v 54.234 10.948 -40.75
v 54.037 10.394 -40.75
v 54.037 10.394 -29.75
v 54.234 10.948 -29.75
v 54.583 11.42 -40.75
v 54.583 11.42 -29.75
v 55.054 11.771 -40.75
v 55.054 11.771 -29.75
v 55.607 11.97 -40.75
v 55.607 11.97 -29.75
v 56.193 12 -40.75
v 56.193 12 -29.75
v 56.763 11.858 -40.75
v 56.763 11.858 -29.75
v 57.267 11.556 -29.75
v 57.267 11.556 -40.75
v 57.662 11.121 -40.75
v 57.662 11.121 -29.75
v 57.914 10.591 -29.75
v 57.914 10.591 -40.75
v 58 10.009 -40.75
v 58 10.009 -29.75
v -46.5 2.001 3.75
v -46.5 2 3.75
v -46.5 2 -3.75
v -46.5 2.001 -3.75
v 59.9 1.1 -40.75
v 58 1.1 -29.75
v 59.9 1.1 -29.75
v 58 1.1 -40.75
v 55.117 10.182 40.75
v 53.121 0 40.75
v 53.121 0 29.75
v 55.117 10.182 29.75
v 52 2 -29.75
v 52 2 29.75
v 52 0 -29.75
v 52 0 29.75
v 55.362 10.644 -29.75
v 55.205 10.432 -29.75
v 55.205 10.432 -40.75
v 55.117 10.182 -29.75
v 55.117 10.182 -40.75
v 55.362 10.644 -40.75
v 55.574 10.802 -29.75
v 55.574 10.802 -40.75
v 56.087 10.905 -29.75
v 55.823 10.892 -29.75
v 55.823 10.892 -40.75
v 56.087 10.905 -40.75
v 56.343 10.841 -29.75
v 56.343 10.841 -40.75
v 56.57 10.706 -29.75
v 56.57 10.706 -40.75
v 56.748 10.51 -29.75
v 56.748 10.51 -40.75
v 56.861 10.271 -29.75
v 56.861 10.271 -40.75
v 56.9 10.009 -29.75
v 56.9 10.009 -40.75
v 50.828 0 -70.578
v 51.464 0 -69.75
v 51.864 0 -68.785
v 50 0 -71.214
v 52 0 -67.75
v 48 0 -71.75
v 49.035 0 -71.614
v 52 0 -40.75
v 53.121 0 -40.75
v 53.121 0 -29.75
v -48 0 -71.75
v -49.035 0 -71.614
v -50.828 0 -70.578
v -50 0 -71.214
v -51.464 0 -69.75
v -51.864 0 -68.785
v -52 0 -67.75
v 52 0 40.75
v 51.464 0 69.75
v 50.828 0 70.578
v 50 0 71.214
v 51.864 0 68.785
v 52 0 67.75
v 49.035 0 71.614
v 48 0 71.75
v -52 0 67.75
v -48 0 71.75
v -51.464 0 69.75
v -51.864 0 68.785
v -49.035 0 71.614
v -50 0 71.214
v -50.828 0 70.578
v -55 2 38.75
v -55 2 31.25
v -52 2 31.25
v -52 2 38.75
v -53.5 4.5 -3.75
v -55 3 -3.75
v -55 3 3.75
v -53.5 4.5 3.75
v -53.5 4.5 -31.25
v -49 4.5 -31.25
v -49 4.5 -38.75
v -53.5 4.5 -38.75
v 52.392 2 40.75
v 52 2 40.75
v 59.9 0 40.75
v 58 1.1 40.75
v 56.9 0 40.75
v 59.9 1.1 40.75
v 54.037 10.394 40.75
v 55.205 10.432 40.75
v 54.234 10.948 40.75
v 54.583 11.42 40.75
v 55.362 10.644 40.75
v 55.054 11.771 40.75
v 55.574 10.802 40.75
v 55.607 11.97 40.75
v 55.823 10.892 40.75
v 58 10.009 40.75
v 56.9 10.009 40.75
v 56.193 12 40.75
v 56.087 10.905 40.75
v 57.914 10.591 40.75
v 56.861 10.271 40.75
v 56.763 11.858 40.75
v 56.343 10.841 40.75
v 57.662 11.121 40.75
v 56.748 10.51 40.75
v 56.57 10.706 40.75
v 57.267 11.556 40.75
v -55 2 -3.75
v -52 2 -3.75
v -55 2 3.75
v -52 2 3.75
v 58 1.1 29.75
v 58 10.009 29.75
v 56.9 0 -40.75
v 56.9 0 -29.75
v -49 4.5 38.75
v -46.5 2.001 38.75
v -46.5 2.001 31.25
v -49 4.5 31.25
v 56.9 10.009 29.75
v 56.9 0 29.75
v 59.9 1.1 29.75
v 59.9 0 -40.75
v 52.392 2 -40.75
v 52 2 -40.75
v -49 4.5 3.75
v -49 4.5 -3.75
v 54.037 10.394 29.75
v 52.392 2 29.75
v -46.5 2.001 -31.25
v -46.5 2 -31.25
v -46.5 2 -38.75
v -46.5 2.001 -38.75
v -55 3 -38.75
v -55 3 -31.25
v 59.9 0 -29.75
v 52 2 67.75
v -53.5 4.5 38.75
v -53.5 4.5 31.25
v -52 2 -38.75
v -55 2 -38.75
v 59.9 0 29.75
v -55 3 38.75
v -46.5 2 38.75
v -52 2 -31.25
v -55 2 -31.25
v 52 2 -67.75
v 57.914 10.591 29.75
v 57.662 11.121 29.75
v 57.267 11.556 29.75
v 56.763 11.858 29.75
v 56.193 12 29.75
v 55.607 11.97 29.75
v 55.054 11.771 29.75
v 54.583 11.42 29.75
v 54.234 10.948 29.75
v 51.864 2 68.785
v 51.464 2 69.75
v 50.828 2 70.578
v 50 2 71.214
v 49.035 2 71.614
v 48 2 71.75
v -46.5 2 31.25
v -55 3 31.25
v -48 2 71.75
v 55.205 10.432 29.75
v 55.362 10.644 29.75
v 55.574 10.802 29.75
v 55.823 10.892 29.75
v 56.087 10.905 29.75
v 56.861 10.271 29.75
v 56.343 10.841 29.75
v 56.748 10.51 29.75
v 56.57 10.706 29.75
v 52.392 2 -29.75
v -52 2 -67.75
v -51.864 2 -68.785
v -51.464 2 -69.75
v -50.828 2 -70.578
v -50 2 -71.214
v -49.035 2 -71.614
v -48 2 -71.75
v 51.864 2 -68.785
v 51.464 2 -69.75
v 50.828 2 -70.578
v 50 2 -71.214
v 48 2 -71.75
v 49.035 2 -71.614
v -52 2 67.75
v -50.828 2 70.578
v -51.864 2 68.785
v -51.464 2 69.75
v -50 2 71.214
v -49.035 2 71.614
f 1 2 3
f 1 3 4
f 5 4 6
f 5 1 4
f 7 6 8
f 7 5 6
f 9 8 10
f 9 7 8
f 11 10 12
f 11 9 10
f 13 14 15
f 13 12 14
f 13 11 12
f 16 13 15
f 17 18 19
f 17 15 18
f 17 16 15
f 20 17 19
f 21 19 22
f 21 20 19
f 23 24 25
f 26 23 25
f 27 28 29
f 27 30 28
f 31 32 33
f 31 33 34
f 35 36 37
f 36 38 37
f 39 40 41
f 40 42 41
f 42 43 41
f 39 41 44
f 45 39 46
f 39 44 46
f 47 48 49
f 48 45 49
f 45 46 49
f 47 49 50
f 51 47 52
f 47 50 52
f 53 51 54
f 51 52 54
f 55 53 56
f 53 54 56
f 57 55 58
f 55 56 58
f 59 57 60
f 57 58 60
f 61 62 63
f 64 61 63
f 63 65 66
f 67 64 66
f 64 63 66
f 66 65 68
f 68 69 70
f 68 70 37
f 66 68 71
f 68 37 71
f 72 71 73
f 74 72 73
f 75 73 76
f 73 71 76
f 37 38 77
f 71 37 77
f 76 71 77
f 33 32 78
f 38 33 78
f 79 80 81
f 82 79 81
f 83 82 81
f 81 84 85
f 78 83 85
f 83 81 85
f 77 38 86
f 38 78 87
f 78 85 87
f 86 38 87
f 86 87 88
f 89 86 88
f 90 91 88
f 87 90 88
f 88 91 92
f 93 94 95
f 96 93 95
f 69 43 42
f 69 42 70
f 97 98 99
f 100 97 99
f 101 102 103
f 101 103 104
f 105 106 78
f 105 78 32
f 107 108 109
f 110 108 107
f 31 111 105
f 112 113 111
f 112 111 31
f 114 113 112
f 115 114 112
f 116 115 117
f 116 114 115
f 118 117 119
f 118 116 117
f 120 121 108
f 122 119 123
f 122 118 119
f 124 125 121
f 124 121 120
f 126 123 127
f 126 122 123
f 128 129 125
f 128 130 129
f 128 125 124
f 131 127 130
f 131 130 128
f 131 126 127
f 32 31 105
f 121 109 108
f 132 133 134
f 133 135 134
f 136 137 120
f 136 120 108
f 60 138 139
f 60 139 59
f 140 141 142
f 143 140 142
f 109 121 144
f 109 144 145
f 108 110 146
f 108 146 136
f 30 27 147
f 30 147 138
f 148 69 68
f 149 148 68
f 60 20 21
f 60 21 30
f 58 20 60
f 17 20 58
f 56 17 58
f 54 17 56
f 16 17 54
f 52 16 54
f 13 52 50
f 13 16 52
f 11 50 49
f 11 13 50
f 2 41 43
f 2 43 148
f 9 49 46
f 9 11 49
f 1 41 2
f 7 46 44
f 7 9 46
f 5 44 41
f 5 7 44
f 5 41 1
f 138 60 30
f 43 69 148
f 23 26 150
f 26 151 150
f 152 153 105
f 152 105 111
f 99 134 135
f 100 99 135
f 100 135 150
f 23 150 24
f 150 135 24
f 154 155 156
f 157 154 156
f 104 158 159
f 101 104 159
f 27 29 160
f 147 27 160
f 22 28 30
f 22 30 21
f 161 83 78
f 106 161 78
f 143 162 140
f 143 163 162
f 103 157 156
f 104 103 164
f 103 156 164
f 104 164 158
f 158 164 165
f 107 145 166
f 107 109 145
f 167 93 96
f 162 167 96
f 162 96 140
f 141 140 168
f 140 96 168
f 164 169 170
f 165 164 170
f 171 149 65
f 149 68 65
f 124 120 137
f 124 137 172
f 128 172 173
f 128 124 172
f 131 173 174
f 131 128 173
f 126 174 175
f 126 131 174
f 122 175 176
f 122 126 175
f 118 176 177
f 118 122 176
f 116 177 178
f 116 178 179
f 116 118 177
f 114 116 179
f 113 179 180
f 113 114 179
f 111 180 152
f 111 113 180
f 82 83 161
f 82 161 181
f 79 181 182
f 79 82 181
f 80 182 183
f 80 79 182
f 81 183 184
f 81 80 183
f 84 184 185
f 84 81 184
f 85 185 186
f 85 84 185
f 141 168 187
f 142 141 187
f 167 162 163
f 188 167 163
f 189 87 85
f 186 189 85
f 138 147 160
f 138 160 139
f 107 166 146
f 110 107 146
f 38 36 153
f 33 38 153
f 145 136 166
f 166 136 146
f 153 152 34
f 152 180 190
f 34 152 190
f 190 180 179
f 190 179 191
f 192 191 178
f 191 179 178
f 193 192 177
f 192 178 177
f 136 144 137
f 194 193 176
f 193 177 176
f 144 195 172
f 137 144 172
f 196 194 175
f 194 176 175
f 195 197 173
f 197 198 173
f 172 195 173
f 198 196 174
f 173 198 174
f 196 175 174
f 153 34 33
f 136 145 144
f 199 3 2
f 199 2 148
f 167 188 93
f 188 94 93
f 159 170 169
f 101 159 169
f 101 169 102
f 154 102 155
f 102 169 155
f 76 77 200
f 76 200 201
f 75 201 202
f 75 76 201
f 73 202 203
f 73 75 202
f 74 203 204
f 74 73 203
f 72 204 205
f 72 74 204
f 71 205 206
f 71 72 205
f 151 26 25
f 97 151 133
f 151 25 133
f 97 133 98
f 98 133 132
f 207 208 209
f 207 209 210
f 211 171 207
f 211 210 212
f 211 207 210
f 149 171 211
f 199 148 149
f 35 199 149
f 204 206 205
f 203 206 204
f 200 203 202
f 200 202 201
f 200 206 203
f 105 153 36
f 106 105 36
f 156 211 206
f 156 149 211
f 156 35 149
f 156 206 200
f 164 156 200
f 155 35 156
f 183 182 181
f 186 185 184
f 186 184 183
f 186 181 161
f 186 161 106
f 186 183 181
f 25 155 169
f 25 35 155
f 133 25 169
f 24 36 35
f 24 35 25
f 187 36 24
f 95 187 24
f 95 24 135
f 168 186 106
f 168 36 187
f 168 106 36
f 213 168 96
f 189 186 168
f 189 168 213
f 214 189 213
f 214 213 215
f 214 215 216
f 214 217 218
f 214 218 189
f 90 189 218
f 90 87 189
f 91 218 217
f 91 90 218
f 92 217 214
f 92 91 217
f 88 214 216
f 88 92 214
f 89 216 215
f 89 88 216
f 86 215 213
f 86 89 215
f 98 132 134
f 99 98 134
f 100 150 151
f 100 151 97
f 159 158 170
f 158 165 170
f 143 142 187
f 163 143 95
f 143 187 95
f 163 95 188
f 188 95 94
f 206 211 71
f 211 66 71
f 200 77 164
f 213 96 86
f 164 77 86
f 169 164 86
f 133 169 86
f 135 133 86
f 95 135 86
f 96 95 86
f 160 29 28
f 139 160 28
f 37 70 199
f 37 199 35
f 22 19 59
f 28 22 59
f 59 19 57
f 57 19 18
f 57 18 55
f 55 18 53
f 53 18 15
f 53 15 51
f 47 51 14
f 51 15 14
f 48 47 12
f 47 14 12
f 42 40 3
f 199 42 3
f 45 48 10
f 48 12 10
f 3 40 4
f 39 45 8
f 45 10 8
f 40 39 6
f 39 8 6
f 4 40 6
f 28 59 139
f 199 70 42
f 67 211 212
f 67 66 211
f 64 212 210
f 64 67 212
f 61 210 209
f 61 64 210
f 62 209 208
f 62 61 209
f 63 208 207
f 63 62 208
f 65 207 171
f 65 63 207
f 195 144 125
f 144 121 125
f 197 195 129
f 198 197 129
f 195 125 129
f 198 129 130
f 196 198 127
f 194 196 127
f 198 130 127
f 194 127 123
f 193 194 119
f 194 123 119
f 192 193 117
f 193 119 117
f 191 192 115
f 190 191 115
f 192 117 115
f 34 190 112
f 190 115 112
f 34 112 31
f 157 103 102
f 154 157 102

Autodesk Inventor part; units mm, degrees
ref_plane "YZ Plane" through (0, 0, 0) normal (1, 0, 0) x (0, 1, 0)
sketch "Эскиз1" plane through (0, 0, 0) normal (0, 1, 0) x (-1, 0, 0)
  line L0 (-48, -71.75) -> (48, -71.75)
  line L1 (52, -67.75) -> (52, 67.75)
  line L2 (48, 71.75) -> (-48, 71.75)
  line L3 (-52, 67.75) -> (-52, -67.75)
  line L4 (-52, -71.75) -> (52, 71.75) construction
  line L5 (52, -71.75) -> (-52, 71.75) construction
  arc A0 (52, 67.75) -> (48, 71.75) centre (48, 67.75) ccw
  arc A1 (48, -71.75) -> (52, -67.75) centre (48, -67.75) ccw
  arc A2 (-52, -67.75) -> (-48, -71.75) centre (-48, -67.75) ccw
  arc A3 (-48, 71.75) -> (-52, 67.75) centre (-48, 67.75) ccw
  line L6 (-52, 40.75) -> (-54, 40.75)
  line L7 (-54, 40.75) -> (-54, 29.75)
  line L8 (-54, 29.75) -> (-52, 29.75)
  line L9 (-52, 29.75) -> (-52, 40.75)
  line L10 (-52, 0) -> (52, 0)
  line L11 (-52, -40.75) -> (-54, -40.75)
  line L12 (-54, -40.75) -> (-54, -29.75)
  line L13 (-54, -29.75) -> (-52, -29.75)
  line L14 (-52, -29.75) -> (-52, -40.75)
  circle A4 centre (-30, -63.75) radius 2.05
  line L15 (0, -71.75) -> (0, 71.75)
  circle A5 centre (30, -63.75) radius 2.05
  circle A6 centre (-30, 63.75) radius 2.05
  circle A7 centre (30, 63.75) radius 2.05
  point P0 (0, 0)
  point P1 (-52, 29.75)
  point P2 (-52, -29.75)
  point P3 (-52, -40.75)
  dimension "d0" = 104
  dimension "d1" = 143.5
  dimension "d2" = 4
  dimension "d3" = 2
  dimension "d4" = 11
  dimension "d5" = 31
  dimension "d6" = 4.1
  dimension "d7" = 8
  dimension "d8" = 60
extrude "Выдавливание1" add sketch "Эскиз1" along normal blind 2 contours A2 L3 L10 L15 L0 | L15 L10 L1 A1 L0 | L15 L2 A0 L1 L10 | L10 L3 A3 L2 L15 | A4 | A5 | A6 | A7
ref_plane "РабПлоскость1" through (-48, 0, 40.75) normal (0, 0, 1) x (1, 0, 0)
sketch "Эскиз3" plane through (-48, 0, 40.75) normal (0, 0, 1) x (1, 0, 0)
  line L0 (100, 0) -> (102.0373, 10.3941)
  arc A0 (106, 10.0094) -> (102.0373, 10.3941) centre (104, 10.0094) ccw
  line L1 (100, 2) -> (96, 2) projected
  line L2 (106, 10.0094) -> (106, 1.1)
  line L3 (101.1209, 0) -> (103.1168, 10.1825)
  arc A1 (104.9, 10.0094) -> (103.1168, 10.1825) centre (104, 10.0094) ccw
  line L4 (104.9, 10.0094) -> (104.9, 0)
  line L5 (100, 0) -> (96, 0) projected
  line L6 (100, 0) -> (101.1209, 0)
  line L7 (104.9, 0) -> (109, 0)
  line L8 (104.9, 0) -> (107.9, 0)
  line L9 (107.9, 0) -> (107.9, 1.1)
  line L10 (107.9, 1.1) -> (106, 1.1)
  line L11 (104.9, 1.1) -> (104.9, 0)
  line L12 (100, 2) -> (100.392, 2)
  line L13 (100, 2) -> (100, 0)
  point P0 (48, 0)
  point P1 (104.1933, 12)
  dimension "d19" = 10
  dimension "d20" = 2
  dimension "d21" = 6
  dimension "d22" = 1.1
  dimension "d23" = 1.1
  dimension "d24" = 1.1
  dimension "d25" = 3
extrude "Выдавливание2" add sketch "Эскиз3" against normal blind 11
mirror "Зеркальное отражение1" about plane through (0, 0, 0) normal (0, 0, 1) of "Выдавливание2"
sketch "Эскиз4" plane through (0, 2, 0) normal (0, 1, 0) x (1, 0, 0)
  line L0 (-46.5, -31.25) -> (-55, -31.25)
  line L1 (-55, -31.25) -> (-55, -38.75)
  line L2 (-55, -38.75) -> (-46.5, -38.75)
  line L3 (-46.5, -38.75) -> (-46.5, -31.25)
  line L4 (-52, 67.75) -> (-52, -67.75) projected
  line L5 (-48, -71.75) -> (48, -71.75) projected
  point P0 (0, 0)
  dimension "d28" = 7.5
  dimension "d29" = 3
  dimension "d30" = 33
  dimension "d31" = 5.5
extrude "Выдавливание3" add sketch "Эскиз4" along normal blind 2.5
mirror "Зеркальное отражение2" about plane through (0, 0, 0) normal (0, 0, 1) of "Выдавливание3"
ref_plane "РабПлоскость3" through (-55, 2, 17.5) normal (0, 0, 1) x (1, 0, 0)
ref_plane "РабПлоскость2" through (-55, 2, 35) normal (0, 0, 1) x (1, 0, 0)
mirror "Зеркальное отражение3" about plane through (-55, 2, 17.5) normal (0, 0, 1) of "Выдавливание3"
chamfer "Фаска1" distance 1.5 angle 45 3 edges at (-55, 4.5, 35) (-55, 4.5, 0) (-55, 4.5, -35)
chamfer "Фаска2" distance 2.5 angle 45 3 edges at (-46.5, 4.5, 35) (-46.5, 4.5, -35) (-46.5, 4.5, 0)
properties part number "Toolbox cover"
